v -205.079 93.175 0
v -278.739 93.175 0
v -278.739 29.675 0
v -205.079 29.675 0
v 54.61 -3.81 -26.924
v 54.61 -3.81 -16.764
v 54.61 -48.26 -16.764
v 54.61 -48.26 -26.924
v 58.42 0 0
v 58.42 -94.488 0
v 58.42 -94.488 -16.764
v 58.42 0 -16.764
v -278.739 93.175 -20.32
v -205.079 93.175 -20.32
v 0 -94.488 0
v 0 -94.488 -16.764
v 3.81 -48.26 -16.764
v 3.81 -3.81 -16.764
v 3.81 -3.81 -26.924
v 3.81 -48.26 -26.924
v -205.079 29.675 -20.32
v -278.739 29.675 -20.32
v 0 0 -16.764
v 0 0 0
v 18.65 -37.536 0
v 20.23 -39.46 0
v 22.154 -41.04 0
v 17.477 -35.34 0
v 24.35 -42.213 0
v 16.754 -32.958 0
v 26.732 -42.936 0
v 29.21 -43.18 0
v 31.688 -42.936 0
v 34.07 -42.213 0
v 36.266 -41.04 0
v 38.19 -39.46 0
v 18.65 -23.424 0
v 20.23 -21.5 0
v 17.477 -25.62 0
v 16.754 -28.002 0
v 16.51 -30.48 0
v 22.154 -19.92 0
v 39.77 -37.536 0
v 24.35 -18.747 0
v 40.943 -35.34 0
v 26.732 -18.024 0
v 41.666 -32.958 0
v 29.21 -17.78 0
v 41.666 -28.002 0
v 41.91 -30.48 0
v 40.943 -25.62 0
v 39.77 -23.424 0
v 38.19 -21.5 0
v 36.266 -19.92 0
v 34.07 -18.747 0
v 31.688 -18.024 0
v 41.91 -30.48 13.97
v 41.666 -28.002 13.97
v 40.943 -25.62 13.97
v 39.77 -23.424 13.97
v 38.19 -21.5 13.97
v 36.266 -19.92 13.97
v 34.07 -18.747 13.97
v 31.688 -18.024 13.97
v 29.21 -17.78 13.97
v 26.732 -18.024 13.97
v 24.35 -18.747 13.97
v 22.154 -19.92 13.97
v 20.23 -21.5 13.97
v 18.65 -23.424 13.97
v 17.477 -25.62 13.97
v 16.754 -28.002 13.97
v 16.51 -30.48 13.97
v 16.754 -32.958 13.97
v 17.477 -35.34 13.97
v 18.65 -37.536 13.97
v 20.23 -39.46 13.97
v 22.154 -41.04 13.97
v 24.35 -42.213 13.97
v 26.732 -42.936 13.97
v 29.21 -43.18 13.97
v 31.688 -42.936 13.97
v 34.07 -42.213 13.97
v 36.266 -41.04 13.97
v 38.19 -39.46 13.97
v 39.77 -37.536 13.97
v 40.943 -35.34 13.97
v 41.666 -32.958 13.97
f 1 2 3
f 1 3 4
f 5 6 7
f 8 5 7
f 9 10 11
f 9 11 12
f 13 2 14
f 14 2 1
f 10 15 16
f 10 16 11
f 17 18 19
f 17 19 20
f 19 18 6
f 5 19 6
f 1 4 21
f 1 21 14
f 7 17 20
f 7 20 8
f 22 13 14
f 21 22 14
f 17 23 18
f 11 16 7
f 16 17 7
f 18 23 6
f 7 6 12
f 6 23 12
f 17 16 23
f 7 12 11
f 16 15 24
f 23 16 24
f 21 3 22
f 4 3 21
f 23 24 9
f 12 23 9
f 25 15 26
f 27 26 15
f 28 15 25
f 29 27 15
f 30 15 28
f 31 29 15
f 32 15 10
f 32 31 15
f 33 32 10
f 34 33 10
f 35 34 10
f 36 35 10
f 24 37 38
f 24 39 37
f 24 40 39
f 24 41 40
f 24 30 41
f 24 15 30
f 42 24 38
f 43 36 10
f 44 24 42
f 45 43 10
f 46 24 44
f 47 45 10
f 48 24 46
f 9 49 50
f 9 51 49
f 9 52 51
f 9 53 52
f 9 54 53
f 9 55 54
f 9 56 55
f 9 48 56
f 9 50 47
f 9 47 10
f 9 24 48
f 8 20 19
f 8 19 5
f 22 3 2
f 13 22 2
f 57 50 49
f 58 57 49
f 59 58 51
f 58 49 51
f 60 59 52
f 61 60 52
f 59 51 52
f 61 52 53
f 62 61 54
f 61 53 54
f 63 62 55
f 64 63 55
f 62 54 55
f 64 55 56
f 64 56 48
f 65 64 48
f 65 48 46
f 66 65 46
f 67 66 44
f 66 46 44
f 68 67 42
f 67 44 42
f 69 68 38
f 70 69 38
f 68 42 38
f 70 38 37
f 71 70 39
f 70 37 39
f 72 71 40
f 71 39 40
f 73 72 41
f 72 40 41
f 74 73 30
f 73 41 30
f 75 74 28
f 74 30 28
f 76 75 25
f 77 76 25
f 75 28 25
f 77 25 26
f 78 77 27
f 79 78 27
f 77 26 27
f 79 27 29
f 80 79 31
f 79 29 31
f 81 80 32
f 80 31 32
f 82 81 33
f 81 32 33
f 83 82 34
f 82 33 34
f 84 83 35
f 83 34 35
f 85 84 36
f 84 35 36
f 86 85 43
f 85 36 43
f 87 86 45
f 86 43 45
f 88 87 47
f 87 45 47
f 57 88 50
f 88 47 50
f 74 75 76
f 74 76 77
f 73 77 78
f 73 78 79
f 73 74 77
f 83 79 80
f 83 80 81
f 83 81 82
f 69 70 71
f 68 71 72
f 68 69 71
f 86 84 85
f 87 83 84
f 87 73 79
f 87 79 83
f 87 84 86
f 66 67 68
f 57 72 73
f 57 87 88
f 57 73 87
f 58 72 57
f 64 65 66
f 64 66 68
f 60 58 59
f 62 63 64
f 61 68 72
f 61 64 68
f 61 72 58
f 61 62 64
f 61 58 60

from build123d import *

# Parameters (mm, degrees)
F0_W     = 58.42
F0_H     = 94.488
F0_R     = 12.7
F1_DEPTH = 16.764
F2_DEPTH = 13.97
F3_W     = 50.8
F3_H     = 44.45
F4_DEPTH = 10.16
F5_W     = 73.66
F5_H     = 63.5
F6_DEPTH = 20.32


with BuildPart() as f1:
    # F0 (on Top) → F1 (new body)
    with BuildSketch(Plane.XY):
        with Locations((29.21, -47.244)):
            Rectangle(F0_W, F0_H)
        with Locations((29.21, -30.48)):
            Circle(F0_R, mode=Mode.SUBTRACT)
        with Locations((29.21, -30.48)):
            Circle(F0_R)
    extrude(amount=-F1_DEPTH)

    # F0 (on Top) → F2 (join)
    with BuildSketch(Plane.XY):
        with Locations((29.21, -30.48)):
            Circle(F0_R)
    extrude(amount=F2_DEPTH)

    # F3 (on face) → F4 (join)
    with BuildSketch(Plane(origin=(0, 0, -16.764), x_dir=(1, 0, 0), z_dir=(0, 0, -1))):
        with Locations((29.21, 26.035)):
            Rectangle(F3_W, F3_H)
    extrude(amount=F4_DEPTH)


with BuildPart() as f6:
    # F5 (on Top) → F6 (new body)
    with BuildSketch(Plane.XY):
        with Locations((-241.9087812304, 61.4245978671)):
            Rectangle(F5_W, F5_H)
    extrude(amount=-F6_DEPTH)


solid = Compound([f1.part, f6.part])
